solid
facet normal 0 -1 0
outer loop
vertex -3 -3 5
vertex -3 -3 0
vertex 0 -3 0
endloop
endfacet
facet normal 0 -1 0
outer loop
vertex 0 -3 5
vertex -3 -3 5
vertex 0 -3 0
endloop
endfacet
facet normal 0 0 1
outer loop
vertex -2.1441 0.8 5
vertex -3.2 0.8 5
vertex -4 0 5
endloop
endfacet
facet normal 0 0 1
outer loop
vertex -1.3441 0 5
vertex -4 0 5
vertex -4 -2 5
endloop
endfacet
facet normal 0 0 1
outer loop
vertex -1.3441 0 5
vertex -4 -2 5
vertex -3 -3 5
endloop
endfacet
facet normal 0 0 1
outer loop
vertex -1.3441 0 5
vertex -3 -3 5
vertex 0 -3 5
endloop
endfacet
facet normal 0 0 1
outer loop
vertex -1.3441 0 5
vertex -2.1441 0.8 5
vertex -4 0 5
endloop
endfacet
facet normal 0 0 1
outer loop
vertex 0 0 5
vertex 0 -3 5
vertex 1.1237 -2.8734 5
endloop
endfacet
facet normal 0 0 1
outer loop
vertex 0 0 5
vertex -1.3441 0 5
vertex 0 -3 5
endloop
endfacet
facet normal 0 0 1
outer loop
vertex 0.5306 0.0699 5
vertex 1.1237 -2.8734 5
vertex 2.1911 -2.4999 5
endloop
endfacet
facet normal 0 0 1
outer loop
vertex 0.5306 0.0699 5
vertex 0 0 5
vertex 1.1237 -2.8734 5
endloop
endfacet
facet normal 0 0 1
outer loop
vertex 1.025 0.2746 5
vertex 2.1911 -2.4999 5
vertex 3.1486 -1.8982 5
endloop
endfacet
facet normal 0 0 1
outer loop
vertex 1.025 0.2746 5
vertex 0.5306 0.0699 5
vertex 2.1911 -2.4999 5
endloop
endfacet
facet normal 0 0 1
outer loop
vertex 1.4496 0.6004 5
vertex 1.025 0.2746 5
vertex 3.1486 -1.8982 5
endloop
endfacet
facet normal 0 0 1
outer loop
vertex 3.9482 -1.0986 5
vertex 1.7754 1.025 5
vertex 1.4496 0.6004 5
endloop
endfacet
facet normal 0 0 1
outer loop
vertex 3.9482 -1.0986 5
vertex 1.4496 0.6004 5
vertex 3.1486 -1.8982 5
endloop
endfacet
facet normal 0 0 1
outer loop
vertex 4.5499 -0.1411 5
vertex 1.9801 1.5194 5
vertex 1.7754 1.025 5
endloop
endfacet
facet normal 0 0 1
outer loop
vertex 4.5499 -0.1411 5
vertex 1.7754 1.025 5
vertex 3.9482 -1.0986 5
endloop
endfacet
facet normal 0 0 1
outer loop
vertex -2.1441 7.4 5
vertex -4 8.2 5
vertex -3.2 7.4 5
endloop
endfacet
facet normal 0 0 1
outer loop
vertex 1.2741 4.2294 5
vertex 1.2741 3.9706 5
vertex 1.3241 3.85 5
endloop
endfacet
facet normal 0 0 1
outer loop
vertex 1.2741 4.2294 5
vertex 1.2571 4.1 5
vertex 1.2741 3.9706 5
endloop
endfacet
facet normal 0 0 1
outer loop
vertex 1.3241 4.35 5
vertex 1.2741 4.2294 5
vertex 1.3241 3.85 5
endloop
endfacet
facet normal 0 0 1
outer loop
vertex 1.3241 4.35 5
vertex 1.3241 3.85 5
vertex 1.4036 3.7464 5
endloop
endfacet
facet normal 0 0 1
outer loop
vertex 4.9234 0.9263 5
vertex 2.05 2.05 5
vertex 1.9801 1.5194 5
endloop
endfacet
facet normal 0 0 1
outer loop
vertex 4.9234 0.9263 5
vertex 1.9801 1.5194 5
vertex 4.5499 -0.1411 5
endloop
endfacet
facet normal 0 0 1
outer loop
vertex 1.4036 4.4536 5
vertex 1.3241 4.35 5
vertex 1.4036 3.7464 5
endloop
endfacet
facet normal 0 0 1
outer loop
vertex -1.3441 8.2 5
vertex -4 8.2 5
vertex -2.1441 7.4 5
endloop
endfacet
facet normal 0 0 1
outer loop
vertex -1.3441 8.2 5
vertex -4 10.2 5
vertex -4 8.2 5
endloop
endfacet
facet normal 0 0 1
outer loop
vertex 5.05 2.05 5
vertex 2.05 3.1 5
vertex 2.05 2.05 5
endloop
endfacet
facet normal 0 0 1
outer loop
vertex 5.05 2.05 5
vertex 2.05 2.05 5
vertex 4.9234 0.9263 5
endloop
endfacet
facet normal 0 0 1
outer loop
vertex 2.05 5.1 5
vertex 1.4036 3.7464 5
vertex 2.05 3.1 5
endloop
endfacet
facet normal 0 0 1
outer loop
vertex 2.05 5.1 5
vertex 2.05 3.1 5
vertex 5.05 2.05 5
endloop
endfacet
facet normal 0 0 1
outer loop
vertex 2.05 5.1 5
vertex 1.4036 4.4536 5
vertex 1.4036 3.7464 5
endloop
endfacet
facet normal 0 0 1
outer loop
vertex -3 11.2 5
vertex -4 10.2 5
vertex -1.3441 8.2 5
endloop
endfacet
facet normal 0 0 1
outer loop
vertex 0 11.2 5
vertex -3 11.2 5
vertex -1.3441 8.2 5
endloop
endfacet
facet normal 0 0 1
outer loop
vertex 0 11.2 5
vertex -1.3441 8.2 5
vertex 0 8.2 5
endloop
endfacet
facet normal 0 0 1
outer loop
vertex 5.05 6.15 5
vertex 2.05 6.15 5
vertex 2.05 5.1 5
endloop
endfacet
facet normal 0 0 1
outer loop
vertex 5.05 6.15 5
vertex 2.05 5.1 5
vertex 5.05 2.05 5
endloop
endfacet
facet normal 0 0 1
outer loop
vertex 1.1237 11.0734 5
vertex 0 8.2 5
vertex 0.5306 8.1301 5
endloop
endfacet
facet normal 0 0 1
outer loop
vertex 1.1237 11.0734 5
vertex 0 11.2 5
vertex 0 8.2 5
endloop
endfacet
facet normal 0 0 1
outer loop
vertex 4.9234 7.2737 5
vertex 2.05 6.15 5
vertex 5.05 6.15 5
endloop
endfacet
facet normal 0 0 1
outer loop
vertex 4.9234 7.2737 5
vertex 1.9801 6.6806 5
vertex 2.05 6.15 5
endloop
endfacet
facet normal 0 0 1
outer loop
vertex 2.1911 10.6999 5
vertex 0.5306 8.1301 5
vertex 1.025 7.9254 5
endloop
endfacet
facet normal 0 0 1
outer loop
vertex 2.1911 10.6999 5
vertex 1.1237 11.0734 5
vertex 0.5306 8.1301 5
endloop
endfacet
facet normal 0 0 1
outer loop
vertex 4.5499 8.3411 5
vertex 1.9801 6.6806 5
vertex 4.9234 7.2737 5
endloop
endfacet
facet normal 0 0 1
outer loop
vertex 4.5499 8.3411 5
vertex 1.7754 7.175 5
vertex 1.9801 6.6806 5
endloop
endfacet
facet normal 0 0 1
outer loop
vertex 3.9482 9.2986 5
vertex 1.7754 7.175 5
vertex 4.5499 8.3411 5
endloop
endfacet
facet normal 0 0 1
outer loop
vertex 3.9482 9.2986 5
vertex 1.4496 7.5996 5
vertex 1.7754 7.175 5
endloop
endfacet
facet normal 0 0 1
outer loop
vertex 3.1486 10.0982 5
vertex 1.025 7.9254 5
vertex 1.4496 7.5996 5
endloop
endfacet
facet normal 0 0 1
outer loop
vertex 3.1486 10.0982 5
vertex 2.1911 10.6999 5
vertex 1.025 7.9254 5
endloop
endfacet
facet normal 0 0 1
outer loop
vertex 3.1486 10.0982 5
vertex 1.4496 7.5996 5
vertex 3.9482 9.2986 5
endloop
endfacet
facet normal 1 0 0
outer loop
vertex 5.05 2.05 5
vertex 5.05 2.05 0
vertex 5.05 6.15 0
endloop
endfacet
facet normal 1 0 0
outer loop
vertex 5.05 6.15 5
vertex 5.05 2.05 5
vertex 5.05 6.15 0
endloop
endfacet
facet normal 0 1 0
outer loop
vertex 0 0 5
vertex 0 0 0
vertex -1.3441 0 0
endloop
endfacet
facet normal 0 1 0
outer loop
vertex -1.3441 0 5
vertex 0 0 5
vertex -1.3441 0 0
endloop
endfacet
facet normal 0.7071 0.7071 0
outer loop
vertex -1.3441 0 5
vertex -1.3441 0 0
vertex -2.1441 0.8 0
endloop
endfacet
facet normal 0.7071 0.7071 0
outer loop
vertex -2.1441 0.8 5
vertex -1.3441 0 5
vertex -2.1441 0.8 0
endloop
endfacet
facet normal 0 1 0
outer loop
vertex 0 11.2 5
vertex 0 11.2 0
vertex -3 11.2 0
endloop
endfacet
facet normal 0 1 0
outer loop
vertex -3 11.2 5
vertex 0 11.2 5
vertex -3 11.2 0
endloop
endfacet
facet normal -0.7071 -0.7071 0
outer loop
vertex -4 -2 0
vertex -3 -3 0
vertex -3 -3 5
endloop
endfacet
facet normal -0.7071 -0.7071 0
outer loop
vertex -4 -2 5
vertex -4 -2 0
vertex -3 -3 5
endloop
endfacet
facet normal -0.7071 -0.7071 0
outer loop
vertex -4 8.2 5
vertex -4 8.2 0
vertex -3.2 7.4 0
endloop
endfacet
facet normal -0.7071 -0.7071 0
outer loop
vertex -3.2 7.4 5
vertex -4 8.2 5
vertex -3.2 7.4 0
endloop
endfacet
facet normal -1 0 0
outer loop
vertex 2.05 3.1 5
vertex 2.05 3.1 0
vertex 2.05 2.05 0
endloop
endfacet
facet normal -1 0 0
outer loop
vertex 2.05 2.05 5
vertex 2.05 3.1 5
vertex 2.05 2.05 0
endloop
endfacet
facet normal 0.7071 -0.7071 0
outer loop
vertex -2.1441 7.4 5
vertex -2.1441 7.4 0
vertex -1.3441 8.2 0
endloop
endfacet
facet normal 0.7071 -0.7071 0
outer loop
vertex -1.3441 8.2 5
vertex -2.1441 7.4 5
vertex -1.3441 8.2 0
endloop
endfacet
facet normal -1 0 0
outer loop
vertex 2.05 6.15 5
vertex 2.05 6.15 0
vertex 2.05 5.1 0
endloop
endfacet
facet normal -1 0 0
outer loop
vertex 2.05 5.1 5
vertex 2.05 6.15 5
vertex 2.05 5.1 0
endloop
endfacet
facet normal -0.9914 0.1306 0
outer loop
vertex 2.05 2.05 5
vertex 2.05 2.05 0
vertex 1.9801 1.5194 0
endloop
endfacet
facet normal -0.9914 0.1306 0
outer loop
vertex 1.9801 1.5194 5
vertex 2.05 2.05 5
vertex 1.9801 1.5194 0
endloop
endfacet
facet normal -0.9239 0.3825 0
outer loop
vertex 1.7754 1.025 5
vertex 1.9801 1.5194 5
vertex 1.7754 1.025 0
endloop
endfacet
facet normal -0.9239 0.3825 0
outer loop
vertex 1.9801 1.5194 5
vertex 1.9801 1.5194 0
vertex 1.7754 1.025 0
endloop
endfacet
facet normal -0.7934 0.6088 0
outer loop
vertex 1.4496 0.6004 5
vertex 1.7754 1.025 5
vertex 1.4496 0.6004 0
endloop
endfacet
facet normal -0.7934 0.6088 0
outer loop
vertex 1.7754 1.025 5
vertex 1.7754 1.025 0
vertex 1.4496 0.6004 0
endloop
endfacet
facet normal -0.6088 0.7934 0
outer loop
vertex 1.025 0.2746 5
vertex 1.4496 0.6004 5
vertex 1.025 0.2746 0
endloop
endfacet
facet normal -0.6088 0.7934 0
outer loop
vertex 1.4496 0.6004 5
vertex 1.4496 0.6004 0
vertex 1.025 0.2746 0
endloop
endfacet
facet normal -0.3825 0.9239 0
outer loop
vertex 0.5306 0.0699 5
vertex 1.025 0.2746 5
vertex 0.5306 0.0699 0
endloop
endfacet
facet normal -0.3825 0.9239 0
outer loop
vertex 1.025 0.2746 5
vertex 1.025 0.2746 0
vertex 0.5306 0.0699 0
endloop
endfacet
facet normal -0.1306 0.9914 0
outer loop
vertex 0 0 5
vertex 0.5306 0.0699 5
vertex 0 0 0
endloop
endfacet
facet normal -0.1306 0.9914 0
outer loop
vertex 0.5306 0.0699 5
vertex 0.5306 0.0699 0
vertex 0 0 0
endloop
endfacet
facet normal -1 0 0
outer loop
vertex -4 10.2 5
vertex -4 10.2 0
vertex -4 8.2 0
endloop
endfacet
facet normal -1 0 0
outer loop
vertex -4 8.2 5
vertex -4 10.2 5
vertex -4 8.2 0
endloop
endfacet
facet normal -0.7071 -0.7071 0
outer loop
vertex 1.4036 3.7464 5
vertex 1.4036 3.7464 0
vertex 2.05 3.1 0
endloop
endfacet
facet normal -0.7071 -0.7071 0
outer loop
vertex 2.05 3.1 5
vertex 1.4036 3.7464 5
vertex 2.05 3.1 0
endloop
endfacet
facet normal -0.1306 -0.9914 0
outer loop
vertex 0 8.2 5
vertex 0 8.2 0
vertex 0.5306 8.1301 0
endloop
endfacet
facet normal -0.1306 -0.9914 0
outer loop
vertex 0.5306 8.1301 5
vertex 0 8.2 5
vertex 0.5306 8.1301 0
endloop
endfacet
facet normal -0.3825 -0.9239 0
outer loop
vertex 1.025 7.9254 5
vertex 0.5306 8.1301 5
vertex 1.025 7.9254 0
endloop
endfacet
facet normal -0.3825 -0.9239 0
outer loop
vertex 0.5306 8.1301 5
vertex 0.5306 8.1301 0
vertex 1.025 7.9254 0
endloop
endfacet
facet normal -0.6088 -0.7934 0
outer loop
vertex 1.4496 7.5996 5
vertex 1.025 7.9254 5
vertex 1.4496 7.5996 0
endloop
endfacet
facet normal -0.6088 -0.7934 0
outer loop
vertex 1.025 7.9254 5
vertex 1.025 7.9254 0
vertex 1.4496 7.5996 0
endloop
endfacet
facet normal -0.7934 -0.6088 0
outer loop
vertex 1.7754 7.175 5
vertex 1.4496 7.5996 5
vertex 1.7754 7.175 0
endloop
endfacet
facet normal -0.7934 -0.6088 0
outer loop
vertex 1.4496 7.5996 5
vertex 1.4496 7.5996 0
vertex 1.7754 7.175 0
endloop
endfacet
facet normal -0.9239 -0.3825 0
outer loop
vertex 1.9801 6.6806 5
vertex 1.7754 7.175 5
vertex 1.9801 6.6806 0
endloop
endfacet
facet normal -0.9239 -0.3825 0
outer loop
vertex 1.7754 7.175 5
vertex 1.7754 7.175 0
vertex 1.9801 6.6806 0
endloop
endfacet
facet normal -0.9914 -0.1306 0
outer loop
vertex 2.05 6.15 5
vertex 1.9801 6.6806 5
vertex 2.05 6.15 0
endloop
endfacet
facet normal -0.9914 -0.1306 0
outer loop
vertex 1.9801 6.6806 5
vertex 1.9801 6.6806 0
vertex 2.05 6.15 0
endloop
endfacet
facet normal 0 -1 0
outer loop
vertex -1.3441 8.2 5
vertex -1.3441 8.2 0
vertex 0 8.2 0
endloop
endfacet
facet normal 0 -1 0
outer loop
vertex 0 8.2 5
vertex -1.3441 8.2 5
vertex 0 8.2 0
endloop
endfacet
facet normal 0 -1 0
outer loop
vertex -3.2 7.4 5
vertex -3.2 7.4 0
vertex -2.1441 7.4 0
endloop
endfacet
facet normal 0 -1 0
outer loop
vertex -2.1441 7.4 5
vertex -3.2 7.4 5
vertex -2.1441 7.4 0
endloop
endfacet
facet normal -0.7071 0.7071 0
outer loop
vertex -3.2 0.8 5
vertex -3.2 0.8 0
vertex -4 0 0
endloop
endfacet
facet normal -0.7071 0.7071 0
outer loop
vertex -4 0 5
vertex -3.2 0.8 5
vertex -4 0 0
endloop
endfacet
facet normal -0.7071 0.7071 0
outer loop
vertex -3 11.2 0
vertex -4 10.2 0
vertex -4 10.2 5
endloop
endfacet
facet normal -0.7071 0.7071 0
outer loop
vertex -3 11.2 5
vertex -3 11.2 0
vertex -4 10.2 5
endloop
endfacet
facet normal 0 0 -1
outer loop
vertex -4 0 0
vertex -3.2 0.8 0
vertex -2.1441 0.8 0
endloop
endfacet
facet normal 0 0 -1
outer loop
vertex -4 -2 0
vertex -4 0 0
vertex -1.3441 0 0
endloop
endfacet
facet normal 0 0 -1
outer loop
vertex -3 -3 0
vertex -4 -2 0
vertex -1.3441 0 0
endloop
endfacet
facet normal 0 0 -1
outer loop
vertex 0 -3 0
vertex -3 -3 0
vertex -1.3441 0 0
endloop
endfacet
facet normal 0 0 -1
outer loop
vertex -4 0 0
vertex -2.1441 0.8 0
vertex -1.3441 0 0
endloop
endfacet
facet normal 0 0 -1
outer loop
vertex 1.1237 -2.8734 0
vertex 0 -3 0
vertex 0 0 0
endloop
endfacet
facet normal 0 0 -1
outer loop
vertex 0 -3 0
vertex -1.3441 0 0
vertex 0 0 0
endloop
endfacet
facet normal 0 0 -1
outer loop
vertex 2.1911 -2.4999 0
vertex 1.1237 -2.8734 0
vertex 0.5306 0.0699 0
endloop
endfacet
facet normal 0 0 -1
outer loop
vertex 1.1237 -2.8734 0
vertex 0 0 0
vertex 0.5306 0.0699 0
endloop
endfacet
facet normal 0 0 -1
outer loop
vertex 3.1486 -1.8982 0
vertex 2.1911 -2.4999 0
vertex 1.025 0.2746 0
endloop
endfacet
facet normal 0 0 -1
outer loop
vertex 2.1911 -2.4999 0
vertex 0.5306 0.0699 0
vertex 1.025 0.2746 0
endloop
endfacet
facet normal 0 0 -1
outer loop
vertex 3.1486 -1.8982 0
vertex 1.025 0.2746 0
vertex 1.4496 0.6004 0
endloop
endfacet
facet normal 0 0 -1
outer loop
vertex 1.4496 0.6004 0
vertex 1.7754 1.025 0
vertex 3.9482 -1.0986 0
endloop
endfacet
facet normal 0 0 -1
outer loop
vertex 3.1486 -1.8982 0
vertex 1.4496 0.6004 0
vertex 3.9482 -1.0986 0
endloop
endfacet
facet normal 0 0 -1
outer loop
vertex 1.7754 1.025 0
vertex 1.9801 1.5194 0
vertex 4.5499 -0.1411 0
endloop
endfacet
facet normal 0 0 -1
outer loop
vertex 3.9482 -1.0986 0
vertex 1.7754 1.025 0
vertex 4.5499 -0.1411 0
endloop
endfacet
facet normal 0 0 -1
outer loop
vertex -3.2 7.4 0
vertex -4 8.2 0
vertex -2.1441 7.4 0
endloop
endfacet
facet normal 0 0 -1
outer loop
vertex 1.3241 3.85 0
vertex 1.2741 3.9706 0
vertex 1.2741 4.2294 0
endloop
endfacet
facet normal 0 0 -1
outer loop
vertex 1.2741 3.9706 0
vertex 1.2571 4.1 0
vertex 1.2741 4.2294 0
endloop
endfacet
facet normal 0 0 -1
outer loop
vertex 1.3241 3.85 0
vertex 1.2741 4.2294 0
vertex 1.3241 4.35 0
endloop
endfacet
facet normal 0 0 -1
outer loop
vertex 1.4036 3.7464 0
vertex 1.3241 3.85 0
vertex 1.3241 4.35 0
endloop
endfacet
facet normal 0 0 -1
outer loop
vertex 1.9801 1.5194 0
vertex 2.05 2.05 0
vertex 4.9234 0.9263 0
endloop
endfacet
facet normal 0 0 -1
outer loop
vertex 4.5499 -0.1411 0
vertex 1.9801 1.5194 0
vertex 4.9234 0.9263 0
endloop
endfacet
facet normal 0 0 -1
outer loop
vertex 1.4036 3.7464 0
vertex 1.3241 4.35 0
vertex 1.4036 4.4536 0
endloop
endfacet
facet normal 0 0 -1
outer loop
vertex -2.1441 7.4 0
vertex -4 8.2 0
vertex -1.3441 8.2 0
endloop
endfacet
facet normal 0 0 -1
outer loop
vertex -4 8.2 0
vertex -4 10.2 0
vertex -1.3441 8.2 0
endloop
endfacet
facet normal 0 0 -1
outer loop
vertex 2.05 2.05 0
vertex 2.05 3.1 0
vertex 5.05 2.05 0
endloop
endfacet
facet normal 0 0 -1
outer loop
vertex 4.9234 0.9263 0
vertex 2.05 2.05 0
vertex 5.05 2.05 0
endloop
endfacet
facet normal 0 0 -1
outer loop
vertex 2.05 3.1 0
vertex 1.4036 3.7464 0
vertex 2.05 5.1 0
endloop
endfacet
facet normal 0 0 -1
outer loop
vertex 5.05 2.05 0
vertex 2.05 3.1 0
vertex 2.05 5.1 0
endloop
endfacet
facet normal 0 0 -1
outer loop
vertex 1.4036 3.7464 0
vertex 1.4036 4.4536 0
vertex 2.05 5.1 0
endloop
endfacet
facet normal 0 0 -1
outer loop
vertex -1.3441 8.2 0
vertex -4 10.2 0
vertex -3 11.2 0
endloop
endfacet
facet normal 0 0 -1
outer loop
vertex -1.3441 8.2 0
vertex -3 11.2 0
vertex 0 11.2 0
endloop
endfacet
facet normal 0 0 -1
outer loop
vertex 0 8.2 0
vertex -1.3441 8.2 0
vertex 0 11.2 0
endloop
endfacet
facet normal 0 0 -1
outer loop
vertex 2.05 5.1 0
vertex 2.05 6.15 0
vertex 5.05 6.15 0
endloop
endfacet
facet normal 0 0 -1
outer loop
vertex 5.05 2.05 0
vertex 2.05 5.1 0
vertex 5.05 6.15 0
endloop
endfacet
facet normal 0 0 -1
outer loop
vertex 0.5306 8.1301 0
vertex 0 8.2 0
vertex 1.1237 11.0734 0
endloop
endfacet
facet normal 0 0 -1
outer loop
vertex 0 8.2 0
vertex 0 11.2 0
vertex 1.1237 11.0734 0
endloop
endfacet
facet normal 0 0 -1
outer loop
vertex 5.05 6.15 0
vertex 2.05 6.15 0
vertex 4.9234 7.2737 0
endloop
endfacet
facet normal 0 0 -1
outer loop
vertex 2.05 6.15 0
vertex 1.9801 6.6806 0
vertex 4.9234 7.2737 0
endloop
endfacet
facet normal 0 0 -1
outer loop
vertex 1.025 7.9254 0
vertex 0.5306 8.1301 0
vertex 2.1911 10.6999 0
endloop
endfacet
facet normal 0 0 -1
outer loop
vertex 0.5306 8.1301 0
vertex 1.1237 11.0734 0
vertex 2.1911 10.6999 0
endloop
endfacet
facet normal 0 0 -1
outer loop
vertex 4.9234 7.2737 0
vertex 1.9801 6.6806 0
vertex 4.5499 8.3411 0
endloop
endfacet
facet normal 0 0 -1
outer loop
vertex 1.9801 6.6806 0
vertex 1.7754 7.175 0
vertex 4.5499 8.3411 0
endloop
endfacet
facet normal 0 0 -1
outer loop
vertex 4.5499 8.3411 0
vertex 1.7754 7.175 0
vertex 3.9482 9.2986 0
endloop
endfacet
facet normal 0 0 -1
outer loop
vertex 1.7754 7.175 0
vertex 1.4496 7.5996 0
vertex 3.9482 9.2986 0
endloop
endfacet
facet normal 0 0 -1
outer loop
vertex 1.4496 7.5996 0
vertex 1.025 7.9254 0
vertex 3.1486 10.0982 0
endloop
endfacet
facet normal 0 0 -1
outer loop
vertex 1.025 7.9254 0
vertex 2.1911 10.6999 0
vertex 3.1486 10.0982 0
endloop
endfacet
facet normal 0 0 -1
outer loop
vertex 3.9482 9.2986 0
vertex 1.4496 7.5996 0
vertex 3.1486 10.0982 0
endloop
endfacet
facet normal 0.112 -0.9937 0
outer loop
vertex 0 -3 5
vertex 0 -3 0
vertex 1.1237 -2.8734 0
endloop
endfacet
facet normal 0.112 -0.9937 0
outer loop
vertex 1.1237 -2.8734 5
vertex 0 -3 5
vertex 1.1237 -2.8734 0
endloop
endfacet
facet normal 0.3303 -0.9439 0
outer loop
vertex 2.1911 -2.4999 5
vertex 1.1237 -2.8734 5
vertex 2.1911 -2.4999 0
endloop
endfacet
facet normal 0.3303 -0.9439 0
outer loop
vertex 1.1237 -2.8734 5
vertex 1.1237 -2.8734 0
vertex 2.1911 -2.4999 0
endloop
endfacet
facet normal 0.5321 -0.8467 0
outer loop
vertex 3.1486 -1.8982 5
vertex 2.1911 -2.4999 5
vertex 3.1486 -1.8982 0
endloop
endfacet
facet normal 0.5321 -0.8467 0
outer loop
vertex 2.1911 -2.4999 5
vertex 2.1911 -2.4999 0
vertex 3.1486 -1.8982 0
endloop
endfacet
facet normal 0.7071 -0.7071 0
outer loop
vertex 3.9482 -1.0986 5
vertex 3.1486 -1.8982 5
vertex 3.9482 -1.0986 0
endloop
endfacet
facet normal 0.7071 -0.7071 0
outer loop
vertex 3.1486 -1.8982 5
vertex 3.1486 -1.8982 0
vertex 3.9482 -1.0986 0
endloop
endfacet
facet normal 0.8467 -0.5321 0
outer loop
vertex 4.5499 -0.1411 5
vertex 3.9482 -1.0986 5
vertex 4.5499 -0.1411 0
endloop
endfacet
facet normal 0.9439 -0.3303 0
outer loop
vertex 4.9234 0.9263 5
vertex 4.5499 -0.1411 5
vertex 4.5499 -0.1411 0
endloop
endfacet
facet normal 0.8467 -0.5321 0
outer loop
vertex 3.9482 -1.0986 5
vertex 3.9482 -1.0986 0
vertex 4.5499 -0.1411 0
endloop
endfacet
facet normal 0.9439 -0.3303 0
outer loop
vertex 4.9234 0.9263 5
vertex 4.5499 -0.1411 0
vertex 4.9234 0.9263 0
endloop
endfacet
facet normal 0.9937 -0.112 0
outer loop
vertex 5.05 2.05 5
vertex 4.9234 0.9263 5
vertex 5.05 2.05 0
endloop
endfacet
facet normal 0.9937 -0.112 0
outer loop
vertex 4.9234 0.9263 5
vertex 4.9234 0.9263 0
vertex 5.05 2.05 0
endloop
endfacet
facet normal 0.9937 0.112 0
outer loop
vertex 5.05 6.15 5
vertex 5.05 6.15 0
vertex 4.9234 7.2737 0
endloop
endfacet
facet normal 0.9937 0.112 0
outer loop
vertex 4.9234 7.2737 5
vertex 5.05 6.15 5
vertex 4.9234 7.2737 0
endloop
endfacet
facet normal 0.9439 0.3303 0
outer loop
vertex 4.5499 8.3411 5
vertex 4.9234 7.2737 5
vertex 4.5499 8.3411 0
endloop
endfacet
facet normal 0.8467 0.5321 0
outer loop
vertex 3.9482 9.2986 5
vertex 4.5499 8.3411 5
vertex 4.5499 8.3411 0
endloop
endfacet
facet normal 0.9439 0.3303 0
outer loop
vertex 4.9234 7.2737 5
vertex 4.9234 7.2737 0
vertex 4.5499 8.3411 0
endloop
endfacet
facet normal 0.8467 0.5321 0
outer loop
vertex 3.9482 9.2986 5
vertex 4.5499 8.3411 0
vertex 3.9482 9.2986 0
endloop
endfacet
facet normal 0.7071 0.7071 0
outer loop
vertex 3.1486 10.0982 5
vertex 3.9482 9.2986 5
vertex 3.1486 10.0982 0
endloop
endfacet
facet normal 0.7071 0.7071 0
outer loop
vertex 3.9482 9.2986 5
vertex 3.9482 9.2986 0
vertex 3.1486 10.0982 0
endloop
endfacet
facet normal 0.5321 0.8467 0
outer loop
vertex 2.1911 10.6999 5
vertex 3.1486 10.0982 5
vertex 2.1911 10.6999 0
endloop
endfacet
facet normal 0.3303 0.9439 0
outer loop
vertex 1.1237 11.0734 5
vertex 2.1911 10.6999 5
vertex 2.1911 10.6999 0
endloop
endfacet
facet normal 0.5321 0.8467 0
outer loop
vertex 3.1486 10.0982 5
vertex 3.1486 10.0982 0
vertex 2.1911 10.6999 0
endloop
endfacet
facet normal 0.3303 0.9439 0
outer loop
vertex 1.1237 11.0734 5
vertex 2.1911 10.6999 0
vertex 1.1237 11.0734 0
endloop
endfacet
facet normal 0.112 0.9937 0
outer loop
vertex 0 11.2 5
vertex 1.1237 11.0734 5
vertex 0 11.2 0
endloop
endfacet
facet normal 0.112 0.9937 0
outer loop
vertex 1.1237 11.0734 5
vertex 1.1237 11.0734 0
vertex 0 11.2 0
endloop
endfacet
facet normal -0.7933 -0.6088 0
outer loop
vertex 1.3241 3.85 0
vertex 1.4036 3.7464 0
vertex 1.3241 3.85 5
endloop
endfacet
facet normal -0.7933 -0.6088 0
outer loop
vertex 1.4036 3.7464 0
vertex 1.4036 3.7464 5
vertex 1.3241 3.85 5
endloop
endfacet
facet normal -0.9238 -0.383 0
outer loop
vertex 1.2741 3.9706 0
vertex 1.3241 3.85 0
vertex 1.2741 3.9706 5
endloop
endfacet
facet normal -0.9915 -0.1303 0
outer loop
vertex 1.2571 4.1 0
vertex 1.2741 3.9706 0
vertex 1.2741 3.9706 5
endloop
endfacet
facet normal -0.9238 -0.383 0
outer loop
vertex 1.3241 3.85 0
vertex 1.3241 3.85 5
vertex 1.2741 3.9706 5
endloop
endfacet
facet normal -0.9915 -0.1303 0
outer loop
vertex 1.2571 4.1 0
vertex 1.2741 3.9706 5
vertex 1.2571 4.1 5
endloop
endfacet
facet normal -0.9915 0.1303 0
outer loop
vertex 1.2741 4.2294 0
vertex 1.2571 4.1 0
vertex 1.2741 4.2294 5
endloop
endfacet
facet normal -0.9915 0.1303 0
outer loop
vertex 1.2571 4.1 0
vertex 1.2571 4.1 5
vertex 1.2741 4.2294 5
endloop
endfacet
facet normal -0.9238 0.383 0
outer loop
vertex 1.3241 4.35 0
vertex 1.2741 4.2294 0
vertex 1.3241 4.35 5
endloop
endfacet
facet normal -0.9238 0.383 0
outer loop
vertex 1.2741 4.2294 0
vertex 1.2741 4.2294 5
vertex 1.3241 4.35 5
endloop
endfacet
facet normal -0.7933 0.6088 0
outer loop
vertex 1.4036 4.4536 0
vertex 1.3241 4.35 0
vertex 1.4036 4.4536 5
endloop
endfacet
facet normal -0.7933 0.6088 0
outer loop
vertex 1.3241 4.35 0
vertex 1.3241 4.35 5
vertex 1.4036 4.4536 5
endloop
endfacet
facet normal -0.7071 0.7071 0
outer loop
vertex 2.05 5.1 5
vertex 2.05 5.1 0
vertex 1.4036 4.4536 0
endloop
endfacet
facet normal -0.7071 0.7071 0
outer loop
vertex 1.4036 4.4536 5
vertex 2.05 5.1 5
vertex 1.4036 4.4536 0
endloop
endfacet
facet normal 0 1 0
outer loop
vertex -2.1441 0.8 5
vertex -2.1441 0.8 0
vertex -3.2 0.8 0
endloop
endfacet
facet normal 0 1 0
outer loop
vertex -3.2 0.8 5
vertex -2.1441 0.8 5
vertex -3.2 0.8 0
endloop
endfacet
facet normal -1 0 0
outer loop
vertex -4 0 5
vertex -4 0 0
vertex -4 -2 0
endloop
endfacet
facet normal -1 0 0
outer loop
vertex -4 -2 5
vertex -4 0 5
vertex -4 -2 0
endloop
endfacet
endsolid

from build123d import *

# Parameters (mm, degrees)
F1_DEPTH = 5
F2_SIZE  = 1
F3_R     = 0.5


with BuildPart() as f1:
    # F0 (on Top) → F1 (new body)
    with BuildSketch(Plane.XY):
        with BuildLine():
            ThreePointArc((0, 8.2), (1.449569, 7.599569), (2.05, 6.15))
            Line((2.05, 6.15), (2.05, 5.1))
            Line((2.05, 5.1), (2.05, 4.1))
            Line((2.05, 4.1), (2.05, 3.1))
            Line((2.05, 3.1), (2.05, 2.05))
            ThreePointArc((2.05, 2.05), (1.449569, 0.600431), (0, 0))
            Line((0, 0), (-1.344113, 0))
            Line((-1.344113, 0), (-4, 0))
            Line((-4, 0), (-4, -3))
            Line((-4, -3), (0, -3))
            ThreePointArc((0, -3), (3.570889, -1.520889), (5.05, 2.05))
            Line((5.05, 2.05), (5.05, 6.15))
            ThreePointArc((5.05, 6.15), (3.570889, 9.720889), (0, 11.2))
            Line((0, 11.2), (-4, 11.2))
            Line((-4, 11.2), (-4, 8.2))
            Line((-4, 8.2), (-1.344113, 8.2))
            Line((-1.344113, 8.2), (0, 8.2))
        make_face()
        Polygon((-2.144113, 7.4), (-1.344113, 8.2), (-4, 8.2), (-3.2, 7.4), align=None)
        Polygon((-3.2, 0.8), (-4, 0), (-1.344113, 0), (-2.144113, 0.8), align=None)
        Polygon((2.05, 4.1), (2.05, 5.1), (1.05, 4.1), align=None)
        Polygon((2.05, 3.1), (2.05, 4.1), (1.05, 4.1), align=None)
    extrude(amount=F1_DEPTH)

    # F2
    f2_edges = [f1.edges().sort_by_distance(p)[0] for p in [
        (-4, 11.2, 2.5),
        (-4, -3, 2.5),
    ]]
    chamfer(f2_edges, length=F2_SIZE)

    # F3
    f3_edges = [f1.edges().sort_by_distance(p)[0] for p in [
        (1.05, 4.1, 2.5),
    ]]
    fillet(f3_edges, radius=F3_R)


solid = f1.part
